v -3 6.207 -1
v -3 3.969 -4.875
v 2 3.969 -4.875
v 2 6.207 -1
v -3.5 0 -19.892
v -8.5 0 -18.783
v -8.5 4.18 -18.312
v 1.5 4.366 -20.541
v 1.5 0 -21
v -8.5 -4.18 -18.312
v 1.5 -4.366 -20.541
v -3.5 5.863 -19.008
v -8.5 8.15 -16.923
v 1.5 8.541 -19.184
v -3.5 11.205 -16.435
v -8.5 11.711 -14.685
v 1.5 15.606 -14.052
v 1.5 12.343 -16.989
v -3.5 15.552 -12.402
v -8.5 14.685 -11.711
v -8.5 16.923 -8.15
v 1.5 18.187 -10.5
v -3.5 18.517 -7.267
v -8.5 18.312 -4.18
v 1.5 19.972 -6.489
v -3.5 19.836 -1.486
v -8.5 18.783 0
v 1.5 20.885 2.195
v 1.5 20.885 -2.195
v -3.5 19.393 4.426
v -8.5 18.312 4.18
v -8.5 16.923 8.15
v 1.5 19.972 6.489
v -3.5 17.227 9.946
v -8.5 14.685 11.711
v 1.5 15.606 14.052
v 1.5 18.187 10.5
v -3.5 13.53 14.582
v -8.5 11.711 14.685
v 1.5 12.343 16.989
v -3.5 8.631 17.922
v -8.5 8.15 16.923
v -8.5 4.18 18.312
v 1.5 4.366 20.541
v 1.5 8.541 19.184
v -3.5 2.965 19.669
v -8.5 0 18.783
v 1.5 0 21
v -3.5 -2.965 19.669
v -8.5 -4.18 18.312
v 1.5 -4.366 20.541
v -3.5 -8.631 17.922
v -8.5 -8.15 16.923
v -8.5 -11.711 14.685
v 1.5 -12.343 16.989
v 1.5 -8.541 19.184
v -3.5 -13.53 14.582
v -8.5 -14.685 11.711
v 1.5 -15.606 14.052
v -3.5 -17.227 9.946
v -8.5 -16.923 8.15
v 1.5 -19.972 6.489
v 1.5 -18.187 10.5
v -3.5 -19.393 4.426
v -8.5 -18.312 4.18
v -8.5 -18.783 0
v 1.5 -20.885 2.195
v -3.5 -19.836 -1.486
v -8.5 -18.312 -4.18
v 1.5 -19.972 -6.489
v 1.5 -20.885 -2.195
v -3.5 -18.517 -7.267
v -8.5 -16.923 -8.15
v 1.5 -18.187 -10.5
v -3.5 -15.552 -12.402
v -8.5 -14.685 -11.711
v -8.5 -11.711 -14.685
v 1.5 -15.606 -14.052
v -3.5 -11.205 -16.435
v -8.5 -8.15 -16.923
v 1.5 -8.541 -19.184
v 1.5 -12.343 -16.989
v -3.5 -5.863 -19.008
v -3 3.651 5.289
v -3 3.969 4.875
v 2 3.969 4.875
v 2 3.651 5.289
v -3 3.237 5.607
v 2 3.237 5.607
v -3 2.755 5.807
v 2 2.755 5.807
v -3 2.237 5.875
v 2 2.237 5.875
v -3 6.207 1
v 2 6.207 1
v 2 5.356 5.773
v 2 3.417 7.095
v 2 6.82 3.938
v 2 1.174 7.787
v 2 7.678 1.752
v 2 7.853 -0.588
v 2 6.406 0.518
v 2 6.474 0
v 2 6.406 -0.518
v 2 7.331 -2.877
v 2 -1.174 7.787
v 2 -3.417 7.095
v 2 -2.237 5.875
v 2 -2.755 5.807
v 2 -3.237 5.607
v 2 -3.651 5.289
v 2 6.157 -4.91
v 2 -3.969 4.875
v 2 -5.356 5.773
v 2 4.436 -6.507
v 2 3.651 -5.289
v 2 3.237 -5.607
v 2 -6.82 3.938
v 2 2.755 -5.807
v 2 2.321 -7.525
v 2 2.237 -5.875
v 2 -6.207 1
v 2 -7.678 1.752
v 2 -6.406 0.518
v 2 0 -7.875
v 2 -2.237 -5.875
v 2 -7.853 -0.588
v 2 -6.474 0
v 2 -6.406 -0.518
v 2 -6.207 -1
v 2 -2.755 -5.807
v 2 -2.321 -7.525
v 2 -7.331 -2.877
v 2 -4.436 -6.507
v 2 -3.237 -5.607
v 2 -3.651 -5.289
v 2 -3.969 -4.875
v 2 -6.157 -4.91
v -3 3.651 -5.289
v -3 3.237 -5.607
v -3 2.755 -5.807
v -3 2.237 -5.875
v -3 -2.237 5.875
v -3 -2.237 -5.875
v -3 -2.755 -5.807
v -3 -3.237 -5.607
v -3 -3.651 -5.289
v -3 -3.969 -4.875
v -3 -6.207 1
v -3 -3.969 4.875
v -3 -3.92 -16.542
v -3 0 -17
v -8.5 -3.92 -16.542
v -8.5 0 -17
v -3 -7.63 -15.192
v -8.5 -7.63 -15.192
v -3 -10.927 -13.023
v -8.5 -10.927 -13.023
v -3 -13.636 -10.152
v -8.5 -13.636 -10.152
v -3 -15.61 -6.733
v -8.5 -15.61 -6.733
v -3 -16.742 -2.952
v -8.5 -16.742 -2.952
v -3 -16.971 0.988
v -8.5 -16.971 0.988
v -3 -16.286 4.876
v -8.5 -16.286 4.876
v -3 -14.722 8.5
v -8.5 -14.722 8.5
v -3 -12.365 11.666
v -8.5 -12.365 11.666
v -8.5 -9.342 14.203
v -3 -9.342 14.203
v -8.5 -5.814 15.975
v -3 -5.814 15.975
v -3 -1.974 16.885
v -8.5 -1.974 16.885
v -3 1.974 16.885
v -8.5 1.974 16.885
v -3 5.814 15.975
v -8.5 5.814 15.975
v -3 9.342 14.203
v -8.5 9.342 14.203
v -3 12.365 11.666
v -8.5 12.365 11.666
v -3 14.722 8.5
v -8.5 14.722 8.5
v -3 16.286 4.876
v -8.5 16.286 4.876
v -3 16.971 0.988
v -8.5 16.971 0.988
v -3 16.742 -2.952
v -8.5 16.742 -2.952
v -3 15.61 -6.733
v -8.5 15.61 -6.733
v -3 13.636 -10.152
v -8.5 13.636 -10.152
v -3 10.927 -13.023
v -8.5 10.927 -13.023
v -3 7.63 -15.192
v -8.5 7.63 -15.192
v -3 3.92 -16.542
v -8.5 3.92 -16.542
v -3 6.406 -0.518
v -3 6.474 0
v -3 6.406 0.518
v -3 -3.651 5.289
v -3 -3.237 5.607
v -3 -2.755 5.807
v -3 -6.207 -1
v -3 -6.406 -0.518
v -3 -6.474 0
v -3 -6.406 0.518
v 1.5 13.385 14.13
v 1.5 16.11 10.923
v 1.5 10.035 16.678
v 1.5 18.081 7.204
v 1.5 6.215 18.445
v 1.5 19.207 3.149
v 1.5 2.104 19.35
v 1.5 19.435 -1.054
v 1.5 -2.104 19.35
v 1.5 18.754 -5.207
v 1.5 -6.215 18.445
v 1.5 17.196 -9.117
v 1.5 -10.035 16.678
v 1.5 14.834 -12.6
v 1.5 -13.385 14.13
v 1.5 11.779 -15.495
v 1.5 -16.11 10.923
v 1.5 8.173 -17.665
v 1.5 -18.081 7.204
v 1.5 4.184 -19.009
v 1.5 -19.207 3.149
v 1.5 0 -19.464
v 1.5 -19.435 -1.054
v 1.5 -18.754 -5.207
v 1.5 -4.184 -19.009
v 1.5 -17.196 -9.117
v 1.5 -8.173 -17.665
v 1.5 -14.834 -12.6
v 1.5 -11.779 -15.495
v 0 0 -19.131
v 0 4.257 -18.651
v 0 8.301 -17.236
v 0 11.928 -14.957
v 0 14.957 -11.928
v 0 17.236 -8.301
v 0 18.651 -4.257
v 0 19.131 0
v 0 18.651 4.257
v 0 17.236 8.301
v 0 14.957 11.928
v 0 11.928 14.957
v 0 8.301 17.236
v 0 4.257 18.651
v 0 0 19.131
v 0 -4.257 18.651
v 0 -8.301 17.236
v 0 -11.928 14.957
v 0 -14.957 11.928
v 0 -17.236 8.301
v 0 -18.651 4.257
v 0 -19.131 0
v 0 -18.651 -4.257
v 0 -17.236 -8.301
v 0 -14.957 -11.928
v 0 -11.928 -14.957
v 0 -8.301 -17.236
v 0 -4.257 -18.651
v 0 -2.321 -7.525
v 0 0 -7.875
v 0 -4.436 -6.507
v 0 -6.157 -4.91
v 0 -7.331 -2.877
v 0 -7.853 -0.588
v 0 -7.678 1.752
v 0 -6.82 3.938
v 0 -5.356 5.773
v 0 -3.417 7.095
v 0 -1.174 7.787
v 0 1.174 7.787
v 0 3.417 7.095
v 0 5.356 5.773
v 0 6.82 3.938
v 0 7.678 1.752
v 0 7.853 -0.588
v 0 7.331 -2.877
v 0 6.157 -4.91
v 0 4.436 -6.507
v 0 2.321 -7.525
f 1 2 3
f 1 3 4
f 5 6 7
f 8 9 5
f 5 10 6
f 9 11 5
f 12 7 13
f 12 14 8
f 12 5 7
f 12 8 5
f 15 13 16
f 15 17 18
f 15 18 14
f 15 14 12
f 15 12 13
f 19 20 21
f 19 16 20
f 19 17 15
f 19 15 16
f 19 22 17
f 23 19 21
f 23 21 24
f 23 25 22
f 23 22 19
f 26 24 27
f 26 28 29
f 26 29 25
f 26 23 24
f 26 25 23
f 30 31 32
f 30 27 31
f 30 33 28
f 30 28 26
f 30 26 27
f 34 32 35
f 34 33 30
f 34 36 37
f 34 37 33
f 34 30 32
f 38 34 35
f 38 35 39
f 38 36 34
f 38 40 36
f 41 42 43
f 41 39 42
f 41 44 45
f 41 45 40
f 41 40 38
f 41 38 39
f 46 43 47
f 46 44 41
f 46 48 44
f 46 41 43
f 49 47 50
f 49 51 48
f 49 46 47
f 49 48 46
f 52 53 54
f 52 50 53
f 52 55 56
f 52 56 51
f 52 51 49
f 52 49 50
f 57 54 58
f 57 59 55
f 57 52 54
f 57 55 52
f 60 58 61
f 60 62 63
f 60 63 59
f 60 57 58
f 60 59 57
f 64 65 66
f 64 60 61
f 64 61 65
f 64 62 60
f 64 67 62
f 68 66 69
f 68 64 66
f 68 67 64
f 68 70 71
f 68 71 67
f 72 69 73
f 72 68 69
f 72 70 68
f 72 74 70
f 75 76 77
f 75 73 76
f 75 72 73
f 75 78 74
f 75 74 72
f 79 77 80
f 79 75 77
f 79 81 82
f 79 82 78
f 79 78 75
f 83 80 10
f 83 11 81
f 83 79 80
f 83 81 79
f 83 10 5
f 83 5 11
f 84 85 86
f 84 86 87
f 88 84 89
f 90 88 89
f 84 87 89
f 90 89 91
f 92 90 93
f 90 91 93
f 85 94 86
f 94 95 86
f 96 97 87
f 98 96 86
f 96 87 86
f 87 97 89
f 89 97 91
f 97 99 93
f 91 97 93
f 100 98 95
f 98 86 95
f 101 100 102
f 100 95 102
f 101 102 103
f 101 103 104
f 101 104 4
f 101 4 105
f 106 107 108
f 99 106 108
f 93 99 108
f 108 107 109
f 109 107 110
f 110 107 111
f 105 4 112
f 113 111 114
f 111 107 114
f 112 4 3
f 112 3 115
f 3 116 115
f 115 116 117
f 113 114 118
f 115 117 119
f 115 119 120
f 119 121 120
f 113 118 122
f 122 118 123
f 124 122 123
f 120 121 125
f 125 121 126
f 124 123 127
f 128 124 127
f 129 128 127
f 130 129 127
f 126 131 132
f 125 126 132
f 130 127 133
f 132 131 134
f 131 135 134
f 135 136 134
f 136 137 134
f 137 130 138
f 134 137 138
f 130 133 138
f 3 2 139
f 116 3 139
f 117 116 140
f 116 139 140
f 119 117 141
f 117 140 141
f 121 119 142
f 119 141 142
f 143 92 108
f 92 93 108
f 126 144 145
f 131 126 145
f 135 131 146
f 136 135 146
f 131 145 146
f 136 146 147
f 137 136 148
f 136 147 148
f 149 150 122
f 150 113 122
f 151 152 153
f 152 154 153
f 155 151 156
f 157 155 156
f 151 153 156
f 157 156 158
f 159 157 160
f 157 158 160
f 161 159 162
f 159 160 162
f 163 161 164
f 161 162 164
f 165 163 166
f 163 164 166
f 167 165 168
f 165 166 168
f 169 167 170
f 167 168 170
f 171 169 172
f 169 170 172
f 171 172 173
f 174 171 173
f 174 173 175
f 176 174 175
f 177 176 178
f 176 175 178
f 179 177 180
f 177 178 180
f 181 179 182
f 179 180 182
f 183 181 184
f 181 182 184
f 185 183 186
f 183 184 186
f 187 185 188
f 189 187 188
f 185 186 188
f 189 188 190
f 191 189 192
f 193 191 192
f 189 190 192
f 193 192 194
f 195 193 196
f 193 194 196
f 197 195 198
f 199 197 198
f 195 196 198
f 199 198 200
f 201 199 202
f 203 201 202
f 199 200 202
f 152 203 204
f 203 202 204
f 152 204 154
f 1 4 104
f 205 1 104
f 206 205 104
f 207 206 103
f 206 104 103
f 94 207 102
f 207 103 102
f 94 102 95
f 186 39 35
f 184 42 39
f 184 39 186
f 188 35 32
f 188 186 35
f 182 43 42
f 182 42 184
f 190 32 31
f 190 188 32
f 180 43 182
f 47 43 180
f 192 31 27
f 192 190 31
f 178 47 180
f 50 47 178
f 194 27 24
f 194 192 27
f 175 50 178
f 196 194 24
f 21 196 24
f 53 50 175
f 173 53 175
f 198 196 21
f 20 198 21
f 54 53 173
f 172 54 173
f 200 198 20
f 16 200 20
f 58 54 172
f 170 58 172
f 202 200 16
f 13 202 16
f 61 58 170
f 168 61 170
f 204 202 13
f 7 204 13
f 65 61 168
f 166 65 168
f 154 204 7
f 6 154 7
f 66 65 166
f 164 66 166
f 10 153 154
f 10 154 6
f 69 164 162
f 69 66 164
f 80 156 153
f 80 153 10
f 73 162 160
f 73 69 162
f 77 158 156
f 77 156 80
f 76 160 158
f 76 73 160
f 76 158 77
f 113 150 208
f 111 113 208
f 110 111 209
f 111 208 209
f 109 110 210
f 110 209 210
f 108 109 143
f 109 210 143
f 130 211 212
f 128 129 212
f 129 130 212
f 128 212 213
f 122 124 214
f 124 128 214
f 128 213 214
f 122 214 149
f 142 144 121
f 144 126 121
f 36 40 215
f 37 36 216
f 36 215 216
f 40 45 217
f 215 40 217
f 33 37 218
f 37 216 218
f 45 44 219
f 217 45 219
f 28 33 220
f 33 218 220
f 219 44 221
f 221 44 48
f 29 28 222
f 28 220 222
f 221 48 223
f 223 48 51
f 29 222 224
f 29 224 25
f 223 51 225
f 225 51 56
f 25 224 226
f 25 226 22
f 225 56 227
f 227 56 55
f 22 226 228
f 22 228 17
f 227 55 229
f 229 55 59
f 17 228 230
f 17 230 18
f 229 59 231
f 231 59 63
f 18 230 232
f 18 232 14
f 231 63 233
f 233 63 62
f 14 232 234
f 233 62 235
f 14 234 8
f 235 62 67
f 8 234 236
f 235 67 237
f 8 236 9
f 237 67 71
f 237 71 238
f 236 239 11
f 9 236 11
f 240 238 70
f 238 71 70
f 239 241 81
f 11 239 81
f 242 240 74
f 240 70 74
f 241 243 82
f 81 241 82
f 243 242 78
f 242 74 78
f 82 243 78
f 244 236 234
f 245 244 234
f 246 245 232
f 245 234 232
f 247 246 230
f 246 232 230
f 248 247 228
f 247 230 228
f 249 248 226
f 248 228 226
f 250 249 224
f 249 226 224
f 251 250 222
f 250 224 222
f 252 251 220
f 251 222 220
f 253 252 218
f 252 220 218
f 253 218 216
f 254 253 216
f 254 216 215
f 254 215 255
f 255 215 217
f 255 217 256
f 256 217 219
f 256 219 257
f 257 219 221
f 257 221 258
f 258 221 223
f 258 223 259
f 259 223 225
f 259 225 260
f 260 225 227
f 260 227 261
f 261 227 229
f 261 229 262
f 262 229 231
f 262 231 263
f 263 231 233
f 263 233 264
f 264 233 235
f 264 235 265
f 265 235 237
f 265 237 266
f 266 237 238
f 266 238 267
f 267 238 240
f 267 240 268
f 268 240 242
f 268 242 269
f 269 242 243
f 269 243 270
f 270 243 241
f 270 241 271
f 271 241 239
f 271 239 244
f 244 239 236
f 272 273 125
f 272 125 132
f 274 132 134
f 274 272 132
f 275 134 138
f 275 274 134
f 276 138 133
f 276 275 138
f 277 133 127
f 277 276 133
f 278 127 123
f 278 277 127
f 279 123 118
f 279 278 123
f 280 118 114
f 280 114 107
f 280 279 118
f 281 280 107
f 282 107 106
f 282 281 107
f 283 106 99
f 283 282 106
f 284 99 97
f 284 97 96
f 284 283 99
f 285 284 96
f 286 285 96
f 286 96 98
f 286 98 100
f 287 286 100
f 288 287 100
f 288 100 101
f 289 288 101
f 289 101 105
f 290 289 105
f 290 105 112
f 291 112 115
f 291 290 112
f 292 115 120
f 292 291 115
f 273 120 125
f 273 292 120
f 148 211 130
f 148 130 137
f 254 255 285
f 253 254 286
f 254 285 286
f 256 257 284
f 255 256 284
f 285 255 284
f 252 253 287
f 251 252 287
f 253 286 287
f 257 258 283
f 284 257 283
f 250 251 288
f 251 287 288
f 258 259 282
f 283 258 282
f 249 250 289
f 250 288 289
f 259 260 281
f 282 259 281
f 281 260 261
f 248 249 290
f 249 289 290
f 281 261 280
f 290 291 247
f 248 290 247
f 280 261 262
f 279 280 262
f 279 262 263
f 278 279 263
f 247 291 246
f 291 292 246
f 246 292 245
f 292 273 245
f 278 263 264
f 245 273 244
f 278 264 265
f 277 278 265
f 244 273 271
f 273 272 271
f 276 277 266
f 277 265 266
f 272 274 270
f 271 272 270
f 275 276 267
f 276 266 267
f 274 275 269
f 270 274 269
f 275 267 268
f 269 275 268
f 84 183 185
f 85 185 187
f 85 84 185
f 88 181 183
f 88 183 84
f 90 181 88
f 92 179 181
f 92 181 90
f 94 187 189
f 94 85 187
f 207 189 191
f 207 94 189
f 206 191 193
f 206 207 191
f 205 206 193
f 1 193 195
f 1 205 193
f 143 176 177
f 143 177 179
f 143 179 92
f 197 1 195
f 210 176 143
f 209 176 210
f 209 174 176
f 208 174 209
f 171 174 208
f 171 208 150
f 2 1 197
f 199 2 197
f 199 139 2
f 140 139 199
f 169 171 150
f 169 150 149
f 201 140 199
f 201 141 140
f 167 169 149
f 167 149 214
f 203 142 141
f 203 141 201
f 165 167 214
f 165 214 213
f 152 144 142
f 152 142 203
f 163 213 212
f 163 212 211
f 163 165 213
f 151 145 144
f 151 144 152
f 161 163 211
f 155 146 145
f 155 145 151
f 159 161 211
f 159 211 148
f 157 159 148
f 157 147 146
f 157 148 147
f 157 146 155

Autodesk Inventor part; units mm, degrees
ref_plane "YZ Plane" through (0, 0, 0) normal (1, 0, 0) x (0, 1, 0)
ref_plane "XZ Plane" through (0, 0, 0) normal (0, 1, 0) x (-1, 0, 0)
ref_plane "XY Plane" through (0, 0, 0) normal (0, 0, 1) x (1, 0, 0)
sketch "Sketch1" plane through (0, 0, 0) normal (0, 1, 0) x (-1, 0, 0)
  line L0 (0, 0) -> (3, 0) construction
  line L1 (3, 0) -> (3, -5.875) construction
  line L2 (3, -5.875) -> (0, -5.875) construction
  line L3 (0, -5.875) -> (0, 0) construction
  line L4 (0, -5.875) -> (3, -5.875)
  line L5 (3, -5.875) -> (3, -23)
  line L6 (3, -23) -> (0, -23)
  line L7 (0, -23) -> (0, -5.875)
  line L8 (8.5, -23) -> (-1.5, -23) construction
  line L9 (-1.5, -23) -> (-1.5, -17)
  line L10 (-1.5, -17) -> (8.5, -17)
  line L11 (8.5, -17) -> (8.5, -23)
  line L12 (-1.5, -21) -> (8.5, -18.7831)
  line L13 (-1.5, -19.4636) -> (8.5, -17.2466)
  line L14 (3, -5.875) -> (5, -5.875)
  line L15 (5, -5.875) -> (5, -9.875)
  line L16 (5, -9.875) -> (3, -9.875)
  line L17 (3, -9.875) -> (3, -5.875)
  line L18 (0, -5.875) -> (-2, -5.875)
  line L19 (-2, -5.875) -> (-2, -7.875)
  line L20 (-2, -7.875) -> (0, -7.875)
  line L21 (0, -7.875) -> (0, -5.875)
  point P0 (3, -17)
  point P1 (0, -17)
  point P2 (0, -19.131)
  point P3 (3, -18.466)
  point P4 (3, -9.875)
  point P5 (0, -7.875)
  dimension "d21" = 3
  dimension "d22" = 5.875
  dimension "d24" = 1.5
  dimension "d25" = 10
  dimension "d26" = 6
  dimension "d27" = 2
  dimension "d29" = 21
  dimension "d30" = 1.5
  dimension "d34" = 2
  dimension "d35" = 4
  dimension "d36" = 2
  dimension "d37" = 2
  dimension "d38" = 12.5
revolve "Revolution1" add sketch "Sketch1" angle 360 about axis through (0, 0, 0) along (-1, 0, 0) contours L4 L5 L10 L7 | L7 L20 L19 L18 | L10 L5 L13 L7 | L10 L11 L13 L5 | L13 L5 L12 L7 | L7 L12 L9 L13 | L13 L11 L12 L5
sketch "Sketch5" plane through (-3, 0, 0) normal (-1, 0, 0) x (0, 0, 1)
  line L0 (0, 0) -> (-5.875, 0) construction
  line L1 (-5.875, 3.3919) -> (0, 6.7839)
  line L2 (0, 6.7839) -> (5.875, 3.3919)
  line L3 (5.875, 3.3919) -> (5.875, -3.3919)
  line L4 (5.875, -3.3919) -> (0, -6.7839)
  line L5 (0, -6.7839) -> (-5.875, -3.3919)
  line L6 (-5.875, -3.3919) -> (-5.875, 3.3919)
  circle A0 centre (0, 0) radius 5.875 projected
  circle A1 centre (0, 0) radius 17 projected
  circle A2 centre (0, 0) radius 5.875 projected
extrude "Extrusion4" cut sketch "Sketch5" along normal through all both and the other way through all contours L1 A0 L6 | L1 L2 A0 | A0 | A0 L5 L6 | L2 L3 A0 | A0 L4 L5 | L3 L4 A0
fillet "Fillet4" radius 2 6 edges at (-0.5, -3.3919, -5.875) (-0.5, 3.3919, -5.875) (-0.5, 6.7839, 0) (-0.5, -6.7839, 0) (-0.5, -3.3919, 5.875) (-0.5, 3.3919, 5.875)
properties part number "Clutch" material "Stainless Steel"
